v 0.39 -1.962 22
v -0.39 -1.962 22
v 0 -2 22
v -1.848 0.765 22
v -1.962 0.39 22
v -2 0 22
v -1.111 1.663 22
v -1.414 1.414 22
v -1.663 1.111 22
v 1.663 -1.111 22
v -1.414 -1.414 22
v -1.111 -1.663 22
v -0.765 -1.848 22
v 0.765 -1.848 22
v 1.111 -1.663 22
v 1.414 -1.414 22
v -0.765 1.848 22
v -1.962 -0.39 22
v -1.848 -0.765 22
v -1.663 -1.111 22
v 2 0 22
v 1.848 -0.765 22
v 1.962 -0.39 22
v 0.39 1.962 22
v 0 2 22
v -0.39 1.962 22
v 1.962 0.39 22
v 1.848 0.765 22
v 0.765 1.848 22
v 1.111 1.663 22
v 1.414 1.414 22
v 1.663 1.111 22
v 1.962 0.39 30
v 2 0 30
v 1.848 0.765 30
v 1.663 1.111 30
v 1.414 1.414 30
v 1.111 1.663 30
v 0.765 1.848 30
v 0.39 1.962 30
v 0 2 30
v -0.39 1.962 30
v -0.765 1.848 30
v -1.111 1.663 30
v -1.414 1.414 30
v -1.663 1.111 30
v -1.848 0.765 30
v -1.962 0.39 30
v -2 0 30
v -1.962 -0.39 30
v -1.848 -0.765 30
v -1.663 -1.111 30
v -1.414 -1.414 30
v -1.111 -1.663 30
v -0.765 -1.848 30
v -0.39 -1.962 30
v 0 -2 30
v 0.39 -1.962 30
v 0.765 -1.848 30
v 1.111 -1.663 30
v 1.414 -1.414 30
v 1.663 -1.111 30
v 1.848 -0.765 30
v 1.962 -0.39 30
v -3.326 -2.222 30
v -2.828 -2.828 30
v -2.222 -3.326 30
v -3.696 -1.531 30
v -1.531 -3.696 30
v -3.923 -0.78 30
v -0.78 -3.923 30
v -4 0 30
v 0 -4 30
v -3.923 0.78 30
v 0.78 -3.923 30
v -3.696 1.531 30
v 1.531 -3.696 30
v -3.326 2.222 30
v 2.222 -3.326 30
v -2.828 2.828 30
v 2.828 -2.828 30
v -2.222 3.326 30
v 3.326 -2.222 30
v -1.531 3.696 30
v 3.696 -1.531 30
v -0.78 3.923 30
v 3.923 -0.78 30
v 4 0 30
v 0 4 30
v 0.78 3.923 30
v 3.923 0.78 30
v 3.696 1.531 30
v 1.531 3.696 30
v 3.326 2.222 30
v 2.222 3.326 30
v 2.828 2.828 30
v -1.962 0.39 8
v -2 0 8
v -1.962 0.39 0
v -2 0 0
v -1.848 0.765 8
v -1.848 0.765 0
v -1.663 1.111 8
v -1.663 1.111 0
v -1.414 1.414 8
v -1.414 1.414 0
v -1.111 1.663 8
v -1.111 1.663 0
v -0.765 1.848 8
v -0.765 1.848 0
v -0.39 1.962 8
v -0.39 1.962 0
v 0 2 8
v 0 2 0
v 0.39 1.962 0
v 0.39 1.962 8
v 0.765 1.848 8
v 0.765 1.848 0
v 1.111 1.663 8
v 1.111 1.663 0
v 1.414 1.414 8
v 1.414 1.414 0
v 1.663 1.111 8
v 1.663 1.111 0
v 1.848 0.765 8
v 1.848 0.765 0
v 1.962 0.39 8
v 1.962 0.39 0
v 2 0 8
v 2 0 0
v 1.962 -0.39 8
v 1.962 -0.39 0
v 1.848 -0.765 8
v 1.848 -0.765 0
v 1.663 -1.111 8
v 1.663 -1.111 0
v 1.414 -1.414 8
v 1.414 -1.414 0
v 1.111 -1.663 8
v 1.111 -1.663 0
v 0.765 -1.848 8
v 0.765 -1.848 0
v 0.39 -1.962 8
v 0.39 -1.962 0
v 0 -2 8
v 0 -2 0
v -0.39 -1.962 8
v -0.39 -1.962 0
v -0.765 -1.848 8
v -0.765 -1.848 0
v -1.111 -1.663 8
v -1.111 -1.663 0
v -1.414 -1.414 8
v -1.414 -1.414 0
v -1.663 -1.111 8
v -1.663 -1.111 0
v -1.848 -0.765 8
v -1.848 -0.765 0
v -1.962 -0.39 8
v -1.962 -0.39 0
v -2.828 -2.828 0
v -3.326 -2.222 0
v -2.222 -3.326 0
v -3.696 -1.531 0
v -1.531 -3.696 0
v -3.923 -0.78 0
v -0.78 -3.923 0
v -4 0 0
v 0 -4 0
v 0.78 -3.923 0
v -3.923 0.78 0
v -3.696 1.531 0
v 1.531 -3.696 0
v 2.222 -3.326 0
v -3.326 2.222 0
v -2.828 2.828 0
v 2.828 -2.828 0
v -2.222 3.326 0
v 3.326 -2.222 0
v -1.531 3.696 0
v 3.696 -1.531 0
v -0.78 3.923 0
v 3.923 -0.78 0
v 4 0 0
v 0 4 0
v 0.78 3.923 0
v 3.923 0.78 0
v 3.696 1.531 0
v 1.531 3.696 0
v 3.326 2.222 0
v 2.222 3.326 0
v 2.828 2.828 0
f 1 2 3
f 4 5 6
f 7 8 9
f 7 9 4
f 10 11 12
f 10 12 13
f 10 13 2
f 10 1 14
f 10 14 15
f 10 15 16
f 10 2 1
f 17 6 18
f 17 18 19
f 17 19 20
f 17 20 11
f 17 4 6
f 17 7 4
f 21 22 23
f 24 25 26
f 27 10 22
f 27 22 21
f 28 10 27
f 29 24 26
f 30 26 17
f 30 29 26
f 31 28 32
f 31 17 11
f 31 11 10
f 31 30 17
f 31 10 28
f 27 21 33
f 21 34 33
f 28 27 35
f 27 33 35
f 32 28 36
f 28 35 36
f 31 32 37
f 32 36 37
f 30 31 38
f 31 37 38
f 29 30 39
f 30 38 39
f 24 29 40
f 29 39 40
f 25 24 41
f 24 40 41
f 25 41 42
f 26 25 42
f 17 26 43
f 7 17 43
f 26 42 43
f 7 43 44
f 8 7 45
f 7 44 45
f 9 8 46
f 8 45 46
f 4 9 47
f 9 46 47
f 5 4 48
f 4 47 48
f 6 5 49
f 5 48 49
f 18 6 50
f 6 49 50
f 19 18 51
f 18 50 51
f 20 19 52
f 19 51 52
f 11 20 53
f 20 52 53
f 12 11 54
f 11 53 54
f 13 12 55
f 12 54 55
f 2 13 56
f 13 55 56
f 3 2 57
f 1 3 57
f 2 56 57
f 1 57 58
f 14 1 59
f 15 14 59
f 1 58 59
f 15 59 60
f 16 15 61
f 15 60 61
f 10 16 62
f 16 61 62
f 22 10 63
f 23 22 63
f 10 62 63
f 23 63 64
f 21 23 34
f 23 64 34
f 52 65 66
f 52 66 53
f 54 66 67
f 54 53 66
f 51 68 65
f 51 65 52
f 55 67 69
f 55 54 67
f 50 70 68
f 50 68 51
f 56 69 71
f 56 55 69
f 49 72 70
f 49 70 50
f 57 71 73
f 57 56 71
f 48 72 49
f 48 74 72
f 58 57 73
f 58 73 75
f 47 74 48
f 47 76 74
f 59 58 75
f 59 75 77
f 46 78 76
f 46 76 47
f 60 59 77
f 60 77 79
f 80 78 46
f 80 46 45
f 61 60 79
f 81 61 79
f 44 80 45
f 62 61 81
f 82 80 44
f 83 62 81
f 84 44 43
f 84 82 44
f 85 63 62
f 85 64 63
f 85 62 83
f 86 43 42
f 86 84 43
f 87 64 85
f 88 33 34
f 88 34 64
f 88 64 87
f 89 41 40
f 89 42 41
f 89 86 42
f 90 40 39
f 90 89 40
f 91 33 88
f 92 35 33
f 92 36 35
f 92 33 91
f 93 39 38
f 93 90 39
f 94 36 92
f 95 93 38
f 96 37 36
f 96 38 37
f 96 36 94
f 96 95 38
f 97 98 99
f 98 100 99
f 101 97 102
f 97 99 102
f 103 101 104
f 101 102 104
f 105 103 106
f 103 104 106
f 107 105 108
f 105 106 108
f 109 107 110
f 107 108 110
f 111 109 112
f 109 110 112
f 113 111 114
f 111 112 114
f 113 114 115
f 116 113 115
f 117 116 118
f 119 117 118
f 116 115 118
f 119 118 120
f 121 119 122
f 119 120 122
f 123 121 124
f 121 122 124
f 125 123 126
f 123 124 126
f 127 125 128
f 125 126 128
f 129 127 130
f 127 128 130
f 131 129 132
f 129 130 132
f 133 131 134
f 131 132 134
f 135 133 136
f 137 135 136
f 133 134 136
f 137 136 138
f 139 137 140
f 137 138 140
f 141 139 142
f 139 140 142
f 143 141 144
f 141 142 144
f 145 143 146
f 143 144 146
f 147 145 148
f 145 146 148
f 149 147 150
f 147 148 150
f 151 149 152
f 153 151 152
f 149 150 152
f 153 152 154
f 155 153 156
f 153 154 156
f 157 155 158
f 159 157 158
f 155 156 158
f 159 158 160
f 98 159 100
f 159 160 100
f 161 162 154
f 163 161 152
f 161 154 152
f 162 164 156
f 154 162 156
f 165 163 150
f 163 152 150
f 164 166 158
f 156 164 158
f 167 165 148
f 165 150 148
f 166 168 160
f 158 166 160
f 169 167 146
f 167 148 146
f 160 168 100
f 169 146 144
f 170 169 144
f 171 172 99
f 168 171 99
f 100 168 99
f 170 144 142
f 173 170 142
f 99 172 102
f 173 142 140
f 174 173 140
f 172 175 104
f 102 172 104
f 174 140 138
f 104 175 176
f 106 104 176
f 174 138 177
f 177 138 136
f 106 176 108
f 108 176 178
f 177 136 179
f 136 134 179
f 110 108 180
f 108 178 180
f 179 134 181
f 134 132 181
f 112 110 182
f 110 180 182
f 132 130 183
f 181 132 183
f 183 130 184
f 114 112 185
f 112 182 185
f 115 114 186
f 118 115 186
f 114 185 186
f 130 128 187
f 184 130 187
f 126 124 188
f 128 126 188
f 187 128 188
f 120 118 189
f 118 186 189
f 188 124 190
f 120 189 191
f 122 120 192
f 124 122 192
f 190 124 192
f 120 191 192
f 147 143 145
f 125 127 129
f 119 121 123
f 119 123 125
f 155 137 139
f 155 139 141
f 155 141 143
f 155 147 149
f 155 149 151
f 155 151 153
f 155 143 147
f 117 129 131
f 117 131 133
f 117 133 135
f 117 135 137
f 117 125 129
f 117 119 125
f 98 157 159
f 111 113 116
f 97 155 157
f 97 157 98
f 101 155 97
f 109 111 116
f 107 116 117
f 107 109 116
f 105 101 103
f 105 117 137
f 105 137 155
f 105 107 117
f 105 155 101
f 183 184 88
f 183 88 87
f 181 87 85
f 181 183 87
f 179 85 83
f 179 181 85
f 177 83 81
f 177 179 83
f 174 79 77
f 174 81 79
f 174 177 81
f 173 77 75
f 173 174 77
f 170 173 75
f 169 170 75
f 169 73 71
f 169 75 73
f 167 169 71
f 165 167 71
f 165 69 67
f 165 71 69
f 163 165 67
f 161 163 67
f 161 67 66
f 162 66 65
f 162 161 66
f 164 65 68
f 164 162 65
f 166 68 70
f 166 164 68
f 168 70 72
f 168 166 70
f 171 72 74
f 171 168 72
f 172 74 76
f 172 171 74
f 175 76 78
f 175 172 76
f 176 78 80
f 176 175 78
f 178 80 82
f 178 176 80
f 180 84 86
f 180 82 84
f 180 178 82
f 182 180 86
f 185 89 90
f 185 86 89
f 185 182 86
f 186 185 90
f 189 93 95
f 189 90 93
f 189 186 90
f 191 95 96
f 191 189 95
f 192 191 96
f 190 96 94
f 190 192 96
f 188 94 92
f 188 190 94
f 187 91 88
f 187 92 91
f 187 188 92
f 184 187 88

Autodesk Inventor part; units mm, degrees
ref_plane "YZ Plane" through (0, 0, 0) normal (1, 0, 0) x (0, 1, 0)
ref_plane "XZ Plane" through (0, 0, 0) normal (0, 1, 0) x (-1, 0, 0)
ref_plane "XY Plane" through (0, 0, 0) normal (0, 0, 1) x (1, 0, 0)
sketch "スケッチ1" plane through (0, 0, 0) normal (0, 0, 1) x (1, 0, 0)
  circle A0 centre (0, 0) radius 4
  circle A1 centre (0, 0) radius 2
  dimension "d0" = 8
  dimension "d1" = 4
extrude "押し出し1" add sketch "スケッチ1" along normal blind 30 contours A0 | A1
sketch "スケッチ2" plane through (0, 0, 30) normal (0, 0, 1) x (1, 0, 0)
  circle A0 centre (0, 0) radius 2
  dimension "d4" = 4
extrude "押し出し2" cut sketch "スケッチ2" against normal blind 8
sketch "スケッチ3" plane through (0, 0, 0) normal (0, 0, -1) x (-1, 0, 0)
  circle A0 centre (0, 0) radius 2
  dimension "d7" = 4
extrude "押し出し3" cut sketch "スケッチ3" against normal blind 8
properties part number "スペーサーm4,30" material "アルミニウム 7075"
